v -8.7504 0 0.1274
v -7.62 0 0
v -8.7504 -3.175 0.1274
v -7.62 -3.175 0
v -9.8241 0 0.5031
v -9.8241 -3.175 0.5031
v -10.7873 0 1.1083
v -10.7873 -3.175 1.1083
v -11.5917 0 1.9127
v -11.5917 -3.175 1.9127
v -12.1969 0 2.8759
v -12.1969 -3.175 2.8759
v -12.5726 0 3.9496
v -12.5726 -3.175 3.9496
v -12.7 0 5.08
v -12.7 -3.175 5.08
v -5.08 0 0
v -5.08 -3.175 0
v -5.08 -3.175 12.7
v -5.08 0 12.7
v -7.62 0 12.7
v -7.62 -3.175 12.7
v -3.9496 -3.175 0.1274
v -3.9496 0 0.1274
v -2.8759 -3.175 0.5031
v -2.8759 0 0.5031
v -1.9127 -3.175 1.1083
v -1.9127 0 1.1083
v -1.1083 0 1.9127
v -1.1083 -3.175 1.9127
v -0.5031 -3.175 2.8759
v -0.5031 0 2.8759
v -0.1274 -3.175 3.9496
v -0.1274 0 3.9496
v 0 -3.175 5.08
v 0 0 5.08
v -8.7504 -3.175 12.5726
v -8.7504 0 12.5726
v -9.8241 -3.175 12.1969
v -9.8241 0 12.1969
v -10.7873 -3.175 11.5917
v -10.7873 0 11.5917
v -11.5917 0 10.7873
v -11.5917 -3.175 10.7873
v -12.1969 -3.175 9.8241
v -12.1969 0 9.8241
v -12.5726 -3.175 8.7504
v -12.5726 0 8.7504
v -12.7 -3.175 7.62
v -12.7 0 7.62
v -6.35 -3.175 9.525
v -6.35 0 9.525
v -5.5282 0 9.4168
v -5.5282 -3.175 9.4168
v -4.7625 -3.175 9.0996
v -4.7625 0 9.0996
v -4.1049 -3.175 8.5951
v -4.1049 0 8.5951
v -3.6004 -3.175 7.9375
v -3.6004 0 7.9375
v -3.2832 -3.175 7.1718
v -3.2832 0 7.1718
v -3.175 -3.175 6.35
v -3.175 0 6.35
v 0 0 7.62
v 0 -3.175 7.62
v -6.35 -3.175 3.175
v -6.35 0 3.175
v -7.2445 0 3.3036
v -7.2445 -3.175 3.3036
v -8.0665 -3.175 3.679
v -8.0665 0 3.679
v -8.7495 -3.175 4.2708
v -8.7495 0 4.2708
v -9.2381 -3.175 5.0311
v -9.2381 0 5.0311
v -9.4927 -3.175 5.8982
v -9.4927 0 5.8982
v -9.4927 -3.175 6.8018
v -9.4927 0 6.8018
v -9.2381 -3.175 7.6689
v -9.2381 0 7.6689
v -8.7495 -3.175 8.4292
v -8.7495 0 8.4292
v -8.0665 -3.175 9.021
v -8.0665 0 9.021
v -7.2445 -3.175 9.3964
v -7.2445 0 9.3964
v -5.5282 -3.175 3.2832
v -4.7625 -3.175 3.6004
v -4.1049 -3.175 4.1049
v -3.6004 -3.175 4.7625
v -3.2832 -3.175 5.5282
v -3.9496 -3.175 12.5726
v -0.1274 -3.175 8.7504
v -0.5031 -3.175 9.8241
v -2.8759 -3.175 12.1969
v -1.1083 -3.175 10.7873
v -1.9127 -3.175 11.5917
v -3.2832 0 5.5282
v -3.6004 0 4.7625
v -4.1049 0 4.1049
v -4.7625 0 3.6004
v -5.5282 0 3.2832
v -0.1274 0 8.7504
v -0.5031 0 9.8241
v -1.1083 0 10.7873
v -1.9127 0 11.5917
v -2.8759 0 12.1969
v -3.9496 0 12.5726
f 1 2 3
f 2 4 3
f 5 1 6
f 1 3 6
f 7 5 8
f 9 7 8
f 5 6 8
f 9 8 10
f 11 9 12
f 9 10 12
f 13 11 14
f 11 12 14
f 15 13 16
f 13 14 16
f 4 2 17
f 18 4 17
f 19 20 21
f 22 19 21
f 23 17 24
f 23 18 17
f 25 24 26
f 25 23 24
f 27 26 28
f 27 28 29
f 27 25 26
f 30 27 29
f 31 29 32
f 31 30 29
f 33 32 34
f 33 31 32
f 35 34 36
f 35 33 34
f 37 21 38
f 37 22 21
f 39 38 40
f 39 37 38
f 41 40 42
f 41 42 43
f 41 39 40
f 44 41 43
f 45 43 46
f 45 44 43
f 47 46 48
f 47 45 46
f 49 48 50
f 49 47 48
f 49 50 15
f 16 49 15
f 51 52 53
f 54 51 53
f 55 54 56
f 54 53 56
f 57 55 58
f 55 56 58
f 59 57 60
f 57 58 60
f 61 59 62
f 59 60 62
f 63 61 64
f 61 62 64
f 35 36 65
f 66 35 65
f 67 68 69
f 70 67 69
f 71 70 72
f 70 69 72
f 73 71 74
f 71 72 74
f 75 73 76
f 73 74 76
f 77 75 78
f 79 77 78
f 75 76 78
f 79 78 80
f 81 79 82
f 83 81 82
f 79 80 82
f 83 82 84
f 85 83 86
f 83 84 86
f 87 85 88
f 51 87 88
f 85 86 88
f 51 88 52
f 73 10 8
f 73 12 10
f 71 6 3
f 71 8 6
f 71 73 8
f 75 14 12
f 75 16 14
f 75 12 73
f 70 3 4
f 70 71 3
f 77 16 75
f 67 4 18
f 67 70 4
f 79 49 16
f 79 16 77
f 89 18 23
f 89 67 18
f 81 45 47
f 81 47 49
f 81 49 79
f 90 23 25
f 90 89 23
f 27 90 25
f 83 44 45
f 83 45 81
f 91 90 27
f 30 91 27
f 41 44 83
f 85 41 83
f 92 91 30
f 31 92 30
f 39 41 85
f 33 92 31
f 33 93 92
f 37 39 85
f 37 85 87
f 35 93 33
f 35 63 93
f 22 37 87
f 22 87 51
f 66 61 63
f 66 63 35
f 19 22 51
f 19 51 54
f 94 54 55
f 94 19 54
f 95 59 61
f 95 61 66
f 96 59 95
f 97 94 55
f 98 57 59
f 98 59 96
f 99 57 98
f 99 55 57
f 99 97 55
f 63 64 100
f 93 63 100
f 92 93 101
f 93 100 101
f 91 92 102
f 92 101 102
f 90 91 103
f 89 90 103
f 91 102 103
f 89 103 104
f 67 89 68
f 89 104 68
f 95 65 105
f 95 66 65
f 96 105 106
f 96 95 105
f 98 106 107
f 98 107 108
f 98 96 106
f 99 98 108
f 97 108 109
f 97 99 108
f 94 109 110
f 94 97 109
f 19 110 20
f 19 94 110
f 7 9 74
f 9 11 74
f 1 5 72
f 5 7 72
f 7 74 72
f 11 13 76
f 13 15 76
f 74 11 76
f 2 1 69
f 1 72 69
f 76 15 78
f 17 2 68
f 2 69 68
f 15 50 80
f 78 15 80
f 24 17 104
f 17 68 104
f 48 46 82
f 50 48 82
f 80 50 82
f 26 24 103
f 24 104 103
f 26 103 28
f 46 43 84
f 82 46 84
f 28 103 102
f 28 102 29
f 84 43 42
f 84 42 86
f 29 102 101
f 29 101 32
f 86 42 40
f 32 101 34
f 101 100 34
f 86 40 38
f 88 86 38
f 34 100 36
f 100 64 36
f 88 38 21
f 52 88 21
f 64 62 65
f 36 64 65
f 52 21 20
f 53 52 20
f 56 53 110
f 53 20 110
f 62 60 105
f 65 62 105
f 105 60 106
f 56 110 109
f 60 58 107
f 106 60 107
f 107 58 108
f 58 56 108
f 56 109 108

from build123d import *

# Parameters (mm, degrees)
F1_DEPTH = 3.175
F2_R     = 5.08
F3_R     = 5.08
F4_R     = 5.08
F5_R     = 5.08


with BuildPart() as f1:
    # F0 (on Front) → F1 (new body)
    with BuildSketch(Plane.XZ):
        with BuildLine():
            Line((-12.7, 0), (-6.35, 0))
            Line((-6.35, 0), (-6.35, 3.175))
            ThreePointArc((-6.35, 3.175), (-9.525, 6.35), (-6.35, 9.525))
            Line((-6.35, 9.525), (-6.35, 12.7))
            Line((-6.35, 12.7), (-12.7, 12.7))
            Line((-12.7, 12.7), (-12.7, 0))
        make_face()
        with BuildLine():
            Line((-6.35, 0), (0, 0))
            Line((0, 0), (0, 12.7))
            Line((0, 12.7), (-6.35, 12.7))
            Line((-6.35, 12.7), (-6.35, 9.525))
            ThreePointArc((-6.35, 9.525), (-4.104936, 8.595064), (-3.175, 6.35))
            ThreePointArc((-3.175, 6.35), (-4.104936, 4.104936), (-6.35, 3.175))
            Line((-6.35, 3.175), (-6.35, 0))
        make_face()
    extrude(amount=F1_DEPTH)

    # F2
    f2_edges = [f1.edges().sort_by_distance(p)[0] for p in [
        (-12.7, -1.5875, 0),
    ]]
    fillet(f2_edges, radius=F2_R)

    # F3
    f3_edges = [f1.edges().sort_by_distance(p)[0] for p in [
        (0, -1.5875, 0),
    ]]
    fillet(f3_edges, radius=F3_R)

    # F4
    f4_edges = [f1.edges().sort_by_distance(p)[0] for p in [
        (0, -1.5875, 12.7),
    ]]
    fillet(f4_edges, radius=F4_R)

    # F5
    f5_edges = [f1.edges().sort_by_distance(p)[0] for p in [
        (-12.7, -1.5875, 12.7),
    ]]
    fillet(f5_edges, radius=F5_R)


solid = f1.part
